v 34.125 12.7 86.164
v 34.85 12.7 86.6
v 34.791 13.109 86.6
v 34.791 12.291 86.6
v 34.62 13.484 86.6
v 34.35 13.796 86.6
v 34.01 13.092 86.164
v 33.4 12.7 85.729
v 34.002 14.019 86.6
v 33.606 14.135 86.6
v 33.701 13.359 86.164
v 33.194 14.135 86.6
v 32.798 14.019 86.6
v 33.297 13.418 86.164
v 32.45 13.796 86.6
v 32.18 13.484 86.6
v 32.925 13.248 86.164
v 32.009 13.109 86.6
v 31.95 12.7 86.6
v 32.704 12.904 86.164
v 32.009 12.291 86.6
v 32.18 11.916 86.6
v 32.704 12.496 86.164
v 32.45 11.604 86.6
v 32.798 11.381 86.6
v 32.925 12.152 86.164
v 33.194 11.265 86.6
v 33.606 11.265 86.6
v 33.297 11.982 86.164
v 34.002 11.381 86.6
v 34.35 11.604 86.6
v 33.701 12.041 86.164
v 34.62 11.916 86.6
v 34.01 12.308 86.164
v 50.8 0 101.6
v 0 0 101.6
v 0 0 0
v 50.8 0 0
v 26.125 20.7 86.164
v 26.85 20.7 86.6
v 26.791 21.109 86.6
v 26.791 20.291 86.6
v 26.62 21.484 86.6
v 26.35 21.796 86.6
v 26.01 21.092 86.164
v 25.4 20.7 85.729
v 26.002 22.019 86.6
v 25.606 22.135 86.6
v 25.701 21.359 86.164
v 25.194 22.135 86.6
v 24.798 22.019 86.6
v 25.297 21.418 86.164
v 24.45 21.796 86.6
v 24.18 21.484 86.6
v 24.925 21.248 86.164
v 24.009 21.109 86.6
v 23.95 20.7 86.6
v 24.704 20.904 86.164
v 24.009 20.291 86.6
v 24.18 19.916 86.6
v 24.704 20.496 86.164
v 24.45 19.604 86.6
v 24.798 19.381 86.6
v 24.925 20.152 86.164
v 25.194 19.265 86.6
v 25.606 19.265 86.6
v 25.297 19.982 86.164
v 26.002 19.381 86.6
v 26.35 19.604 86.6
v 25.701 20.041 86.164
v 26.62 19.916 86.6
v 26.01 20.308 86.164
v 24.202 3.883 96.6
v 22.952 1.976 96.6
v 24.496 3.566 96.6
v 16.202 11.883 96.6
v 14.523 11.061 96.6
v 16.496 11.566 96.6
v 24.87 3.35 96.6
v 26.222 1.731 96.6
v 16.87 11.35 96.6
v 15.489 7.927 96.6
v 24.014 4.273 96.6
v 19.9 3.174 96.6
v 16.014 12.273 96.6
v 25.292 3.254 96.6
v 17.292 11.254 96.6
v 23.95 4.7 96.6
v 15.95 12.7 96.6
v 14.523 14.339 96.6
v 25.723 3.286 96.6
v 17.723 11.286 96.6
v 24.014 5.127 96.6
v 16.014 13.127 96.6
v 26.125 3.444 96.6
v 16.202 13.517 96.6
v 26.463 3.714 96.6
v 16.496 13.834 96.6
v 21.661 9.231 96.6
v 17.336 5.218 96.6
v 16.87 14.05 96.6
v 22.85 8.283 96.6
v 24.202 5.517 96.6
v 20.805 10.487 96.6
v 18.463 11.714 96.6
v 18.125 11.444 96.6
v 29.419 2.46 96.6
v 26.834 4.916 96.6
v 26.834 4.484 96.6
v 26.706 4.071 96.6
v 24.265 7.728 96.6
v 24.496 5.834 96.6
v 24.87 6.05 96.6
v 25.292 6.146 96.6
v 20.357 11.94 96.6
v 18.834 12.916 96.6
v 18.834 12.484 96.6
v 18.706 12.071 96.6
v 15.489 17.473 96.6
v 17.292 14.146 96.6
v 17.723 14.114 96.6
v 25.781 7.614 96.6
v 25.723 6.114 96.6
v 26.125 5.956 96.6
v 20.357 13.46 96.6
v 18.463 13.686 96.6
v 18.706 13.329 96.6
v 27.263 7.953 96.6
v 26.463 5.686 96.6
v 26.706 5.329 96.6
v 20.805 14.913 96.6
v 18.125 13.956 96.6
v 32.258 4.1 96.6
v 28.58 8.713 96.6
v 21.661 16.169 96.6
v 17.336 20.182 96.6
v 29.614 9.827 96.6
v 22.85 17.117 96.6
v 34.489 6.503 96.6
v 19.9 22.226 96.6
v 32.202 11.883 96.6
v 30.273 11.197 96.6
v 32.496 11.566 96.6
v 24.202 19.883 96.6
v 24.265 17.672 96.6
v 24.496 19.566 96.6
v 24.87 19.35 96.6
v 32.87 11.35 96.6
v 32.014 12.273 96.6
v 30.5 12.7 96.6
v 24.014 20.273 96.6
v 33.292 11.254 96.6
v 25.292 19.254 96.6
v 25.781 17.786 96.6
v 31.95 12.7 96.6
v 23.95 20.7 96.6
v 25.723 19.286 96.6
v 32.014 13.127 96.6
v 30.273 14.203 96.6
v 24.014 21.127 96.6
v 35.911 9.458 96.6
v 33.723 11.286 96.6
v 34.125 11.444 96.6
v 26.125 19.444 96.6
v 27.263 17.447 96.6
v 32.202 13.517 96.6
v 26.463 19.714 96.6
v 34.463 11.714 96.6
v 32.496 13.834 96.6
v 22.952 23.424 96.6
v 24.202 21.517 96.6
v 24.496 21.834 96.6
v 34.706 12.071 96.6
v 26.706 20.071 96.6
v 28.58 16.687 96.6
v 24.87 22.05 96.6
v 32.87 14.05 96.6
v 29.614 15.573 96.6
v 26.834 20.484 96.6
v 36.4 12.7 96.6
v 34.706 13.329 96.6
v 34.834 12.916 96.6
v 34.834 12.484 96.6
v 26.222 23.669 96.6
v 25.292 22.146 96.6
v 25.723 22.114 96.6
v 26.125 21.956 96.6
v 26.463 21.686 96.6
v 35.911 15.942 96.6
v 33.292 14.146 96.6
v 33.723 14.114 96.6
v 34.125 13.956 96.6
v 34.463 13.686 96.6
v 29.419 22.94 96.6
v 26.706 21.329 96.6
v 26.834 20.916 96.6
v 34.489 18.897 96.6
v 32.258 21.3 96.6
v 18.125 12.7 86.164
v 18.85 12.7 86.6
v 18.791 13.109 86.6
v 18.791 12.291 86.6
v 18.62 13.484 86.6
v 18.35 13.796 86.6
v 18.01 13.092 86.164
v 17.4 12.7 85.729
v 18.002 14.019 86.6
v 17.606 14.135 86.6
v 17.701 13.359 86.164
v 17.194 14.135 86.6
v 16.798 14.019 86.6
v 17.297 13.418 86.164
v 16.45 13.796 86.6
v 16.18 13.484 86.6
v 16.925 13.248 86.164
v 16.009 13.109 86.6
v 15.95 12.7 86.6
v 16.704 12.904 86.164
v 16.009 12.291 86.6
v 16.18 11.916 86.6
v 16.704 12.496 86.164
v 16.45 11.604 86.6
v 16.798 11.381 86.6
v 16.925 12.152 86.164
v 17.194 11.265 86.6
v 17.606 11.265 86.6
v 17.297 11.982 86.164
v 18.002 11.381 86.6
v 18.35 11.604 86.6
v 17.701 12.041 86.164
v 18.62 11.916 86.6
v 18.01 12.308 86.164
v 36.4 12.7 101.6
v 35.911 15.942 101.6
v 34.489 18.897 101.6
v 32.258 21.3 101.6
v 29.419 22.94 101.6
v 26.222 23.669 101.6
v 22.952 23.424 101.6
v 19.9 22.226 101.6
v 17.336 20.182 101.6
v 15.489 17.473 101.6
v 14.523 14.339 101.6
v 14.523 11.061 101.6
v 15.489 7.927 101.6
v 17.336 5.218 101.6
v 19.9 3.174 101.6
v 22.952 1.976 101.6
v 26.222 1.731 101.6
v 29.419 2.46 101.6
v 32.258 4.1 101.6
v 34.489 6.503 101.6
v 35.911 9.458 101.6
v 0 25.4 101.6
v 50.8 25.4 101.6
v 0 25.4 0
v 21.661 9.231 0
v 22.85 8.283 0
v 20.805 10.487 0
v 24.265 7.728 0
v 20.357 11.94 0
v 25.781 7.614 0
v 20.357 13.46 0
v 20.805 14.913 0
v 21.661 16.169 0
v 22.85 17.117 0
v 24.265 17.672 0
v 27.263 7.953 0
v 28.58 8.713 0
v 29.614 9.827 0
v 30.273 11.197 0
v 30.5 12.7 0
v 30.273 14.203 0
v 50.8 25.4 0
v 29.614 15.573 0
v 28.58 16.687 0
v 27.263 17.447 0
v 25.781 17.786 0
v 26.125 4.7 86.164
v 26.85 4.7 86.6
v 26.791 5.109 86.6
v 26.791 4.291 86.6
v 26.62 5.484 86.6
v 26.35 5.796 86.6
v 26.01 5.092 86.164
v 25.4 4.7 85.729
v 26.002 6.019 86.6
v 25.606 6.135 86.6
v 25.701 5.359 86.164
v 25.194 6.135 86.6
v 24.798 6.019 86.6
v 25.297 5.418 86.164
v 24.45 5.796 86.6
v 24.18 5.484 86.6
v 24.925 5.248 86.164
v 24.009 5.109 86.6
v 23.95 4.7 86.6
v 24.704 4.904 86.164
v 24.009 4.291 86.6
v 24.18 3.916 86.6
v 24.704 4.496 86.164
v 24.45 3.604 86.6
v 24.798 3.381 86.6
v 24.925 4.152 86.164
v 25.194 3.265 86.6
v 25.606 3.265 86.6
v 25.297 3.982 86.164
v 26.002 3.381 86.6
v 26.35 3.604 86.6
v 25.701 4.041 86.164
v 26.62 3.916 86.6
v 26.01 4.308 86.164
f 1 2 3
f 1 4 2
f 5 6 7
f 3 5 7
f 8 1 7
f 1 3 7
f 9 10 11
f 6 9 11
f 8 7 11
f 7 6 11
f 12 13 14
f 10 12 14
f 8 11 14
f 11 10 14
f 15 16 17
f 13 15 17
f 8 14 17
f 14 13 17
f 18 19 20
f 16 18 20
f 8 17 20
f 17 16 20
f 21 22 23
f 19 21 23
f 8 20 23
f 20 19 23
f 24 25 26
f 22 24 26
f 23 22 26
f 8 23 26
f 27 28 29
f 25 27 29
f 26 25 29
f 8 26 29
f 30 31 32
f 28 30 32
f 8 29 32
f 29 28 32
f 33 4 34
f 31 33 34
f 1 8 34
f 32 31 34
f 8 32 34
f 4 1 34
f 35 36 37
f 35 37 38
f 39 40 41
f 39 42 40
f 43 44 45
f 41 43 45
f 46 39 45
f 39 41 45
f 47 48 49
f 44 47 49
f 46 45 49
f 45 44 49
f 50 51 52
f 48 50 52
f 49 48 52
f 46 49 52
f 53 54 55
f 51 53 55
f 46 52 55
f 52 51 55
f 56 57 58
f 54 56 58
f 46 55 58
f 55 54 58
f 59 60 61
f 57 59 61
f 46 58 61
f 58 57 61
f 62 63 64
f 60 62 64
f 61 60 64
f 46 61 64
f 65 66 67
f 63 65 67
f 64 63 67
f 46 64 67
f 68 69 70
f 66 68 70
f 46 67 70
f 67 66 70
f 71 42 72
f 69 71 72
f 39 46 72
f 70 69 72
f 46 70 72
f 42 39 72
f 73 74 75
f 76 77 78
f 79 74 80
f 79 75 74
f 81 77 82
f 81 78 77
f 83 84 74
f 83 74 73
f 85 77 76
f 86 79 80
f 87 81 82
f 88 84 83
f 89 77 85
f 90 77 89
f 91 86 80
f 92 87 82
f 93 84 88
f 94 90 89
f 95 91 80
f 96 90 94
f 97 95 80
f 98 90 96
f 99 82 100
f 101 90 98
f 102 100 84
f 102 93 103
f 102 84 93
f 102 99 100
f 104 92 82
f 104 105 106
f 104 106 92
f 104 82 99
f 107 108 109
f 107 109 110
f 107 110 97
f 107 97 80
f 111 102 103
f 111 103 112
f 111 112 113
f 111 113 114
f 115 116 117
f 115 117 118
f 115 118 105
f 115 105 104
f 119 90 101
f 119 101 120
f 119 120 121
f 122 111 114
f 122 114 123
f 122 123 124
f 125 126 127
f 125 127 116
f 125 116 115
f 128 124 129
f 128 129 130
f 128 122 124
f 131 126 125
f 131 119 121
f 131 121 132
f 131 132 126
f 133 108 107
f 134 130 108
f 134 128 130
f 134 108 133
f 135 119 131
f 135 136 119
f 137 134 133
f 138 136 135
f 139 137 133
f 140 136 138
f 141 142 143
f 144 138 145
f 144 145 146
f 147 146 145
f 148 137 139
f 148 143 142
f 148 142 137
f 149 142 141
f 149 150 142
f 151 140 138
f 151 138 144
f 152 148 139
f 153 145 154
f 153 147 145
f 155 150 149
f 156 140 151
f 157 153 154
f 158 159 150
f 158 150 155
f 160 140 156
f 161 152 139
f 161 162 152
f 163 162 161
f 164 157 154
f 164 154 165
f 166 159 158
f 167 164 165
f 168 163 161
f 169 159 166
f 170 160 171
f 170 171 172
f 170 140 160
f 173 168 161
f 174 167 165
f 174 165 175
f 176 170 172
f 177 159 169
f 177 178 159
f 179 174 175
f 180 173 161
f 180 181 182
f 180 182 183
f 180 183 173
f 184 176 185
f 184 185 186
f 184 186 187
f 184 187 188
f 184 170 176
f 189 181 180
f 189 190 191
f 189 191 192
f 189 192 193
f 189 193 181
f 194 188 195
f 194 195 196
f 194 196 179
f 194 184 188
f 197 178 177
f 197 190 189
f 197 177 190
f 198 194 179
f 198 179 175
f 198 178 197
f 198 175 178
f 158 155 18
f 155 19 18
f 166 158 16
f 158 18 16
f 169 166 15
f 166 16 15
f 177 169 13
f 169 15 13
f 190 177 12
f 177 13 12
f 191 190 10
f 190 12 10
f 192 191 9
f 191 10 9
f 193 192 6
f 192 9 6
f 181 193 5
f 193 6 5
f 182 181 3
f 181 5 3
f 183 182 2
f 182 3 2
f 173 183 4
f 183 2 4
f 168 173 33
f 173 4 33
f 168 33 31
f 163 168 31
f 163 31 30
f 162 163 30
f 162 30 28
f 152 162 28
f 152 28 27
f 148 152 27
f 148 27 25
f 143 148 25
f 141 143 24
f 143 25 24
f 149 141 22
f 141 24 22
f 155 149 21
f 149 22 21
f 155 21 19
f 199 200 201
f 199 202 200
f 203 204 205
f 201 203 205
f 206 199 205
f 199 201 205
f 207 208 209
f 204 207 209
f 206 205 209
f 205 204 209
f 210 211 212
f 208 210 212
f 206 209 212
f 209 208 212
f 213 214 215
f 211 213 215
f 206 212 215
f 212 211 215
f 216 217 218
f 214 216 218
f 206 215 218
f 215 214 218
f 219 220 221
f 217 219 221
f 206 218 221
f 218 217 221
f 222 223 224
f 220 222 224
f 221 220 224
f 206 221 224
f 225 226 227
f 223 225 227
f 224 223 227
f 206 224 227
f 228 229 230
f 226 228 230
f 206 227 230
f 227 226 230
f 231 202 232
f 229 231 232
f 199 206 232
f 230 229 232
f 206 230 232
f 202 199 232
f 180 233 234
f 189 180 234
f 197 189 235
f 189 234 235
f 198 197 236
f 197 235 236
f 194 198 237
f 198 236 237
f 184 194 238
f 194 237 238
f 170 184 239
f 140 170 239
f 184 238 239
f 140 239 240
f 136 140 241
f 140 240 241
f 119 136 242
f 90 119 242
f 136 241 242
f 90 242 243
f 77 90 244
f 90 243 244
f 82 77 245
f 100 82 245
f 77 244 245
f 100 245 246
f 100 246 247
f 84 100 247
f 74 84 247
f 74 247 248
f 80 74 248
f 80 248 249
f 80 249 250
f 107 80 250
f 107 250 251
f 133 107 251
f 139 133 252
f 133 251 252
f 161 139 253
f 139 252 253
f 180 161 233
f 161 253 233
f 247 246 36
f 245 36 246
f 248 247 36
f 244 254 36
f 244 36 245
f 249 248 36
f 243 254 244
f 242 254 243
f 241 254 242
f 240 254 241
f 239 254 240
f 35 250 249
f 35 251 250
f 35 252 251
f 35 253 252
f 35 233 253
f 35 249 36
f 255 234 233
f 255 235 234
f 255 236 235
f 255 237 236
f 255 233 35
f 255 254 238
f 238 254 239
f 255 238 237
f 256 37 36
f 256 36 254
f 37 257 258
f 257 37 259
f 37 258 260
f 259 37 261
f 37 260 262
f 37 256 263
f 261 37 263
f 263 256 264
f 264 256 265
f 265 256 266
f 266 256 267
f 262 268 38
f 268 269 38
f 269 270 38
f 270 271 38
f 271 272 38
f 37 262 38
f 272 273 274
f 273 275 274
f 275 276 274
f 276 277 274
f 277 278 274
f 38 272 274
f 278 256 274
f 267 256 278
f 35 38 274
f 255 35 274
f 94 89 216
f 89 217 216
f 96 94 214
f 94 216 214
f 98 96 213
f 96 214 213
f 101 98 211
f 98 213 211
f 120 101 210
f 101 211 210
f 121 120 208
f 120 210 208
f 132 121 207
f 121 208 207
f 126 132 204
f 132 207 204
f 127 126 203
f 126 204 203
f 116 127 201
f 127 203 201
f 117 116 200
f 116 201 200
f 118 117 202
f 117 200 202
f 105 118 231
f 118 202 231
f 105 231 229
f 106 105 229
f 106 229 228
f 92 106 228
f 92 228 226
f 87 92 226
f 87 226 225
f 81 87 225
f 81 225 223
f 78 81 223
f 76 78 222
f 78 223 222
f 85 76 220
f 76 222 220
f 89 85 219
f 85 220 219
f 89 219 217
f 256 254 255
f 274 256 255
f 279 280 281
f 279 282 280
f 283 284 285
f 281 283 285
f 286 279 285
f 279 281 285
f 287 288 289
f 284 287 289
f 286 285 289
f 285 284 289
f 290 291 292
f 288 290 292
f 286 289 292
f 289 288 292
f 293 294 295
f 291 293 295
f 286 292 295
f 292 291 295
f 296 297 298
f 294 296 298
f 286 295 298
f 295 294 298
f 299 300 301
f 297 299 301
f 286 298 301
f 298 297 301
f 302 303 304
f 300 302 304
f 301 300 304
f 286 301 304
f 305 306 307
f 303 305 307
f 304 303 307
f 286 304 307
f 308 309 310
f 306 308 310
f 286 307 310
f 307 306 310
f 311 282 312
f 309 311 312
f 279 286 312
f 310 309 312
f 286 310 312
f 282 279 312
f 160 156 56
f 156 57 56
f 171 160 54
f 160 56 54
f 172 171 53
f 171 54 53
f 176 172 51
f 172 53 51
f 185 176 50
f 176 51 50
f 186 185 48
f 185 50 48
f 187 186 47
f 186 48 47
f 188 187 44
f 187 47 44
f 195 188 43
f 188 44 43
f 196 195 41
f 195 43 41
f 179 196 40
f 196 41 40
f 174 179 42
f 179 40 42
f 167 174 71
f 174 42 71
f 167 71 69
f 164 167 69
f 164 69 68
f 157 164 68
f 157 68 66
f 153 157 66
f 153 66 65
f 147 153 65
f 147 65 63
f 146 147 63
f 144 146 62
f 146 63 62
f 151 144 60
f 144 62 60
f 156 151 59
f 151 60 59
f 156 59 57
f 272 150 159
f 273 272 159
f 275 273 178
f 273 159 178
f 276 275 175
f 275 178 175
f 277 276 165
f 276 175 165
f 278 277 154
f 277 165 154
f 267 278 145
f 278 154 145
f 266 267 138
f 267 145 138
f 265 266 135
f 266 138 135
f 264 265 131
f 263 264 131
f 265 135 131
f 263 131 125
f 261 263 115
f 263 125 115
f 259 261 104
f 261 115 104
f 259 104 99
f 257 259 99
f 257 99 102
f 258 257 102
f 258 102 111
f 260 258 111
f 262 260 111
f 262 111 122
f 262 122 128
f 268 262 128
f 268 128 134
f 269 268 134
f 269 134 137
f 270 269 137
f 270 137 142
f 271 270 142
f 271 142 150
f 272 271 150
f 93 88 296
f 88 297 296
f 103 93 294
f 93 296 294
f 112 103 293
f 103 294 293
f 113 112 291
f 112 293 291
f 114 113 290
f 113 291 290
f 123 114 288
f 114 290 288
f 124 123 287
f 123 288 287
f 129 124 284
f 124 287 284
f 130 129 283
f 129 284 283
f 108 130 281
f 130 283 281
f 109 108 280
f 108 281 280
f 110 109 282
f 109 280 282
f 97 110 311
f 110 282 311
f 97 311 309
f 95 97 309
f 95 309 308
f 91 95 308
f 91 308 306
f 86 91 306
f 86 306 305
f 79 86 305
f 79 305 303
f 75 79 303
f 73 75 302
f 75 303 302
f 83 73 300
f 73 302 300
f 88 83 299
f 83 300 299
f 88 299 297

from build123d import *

# Parameters (mm, degrees)
SKETCH1_W                  = 50.8
SKETCH1_H                  = 25.4
BASE_DEPTH                 = 101.6
SKETCH2_R                  = 10.999999971
LEADNUT_FLANGE_INSET_DEPTH = 4.999999906
SKETCH3_R                  = 5.09999996
LEADNUT_THROUGH_HOLE_DEPTH = 113.059627066
LEADNUT_HOLE_PATTERN_D     = 2.9
LEADNUT_HOLE_PATTERN_DEPTH = 10.0000054
LEADNUT_HOLE_PATTERN_TIP   = 0.871247898


with BuildPart() as part:
    # Sketch1 → base (new body)
    with BuildSketch(Plane.XY):
        with Locations((25.4, 12.7)):
            Rectangle(SKETCH1_W, SKETCH1_H)
    extrude(amount=BASE_DEPTH)

    # Sketch2 → leadnut_flange_inset (cut)
    with BuildSketch(Plane.XY.offset(101.6)):
        with Locations((25.4, 12.7)):
            Circle(SKETCH2_R)
    extrude(amount=-LEADNUT_FLANGE_INSET_DEPTH, mode=Mode.SUBTRACT)

    # Sketch3 → leadnut_through_hole (cut, through all)
    with BuildSketch(Plane.XY.offset(96.600000094)):
        with Locations((25.4, 12.7)):
            Circle(SKETCH3_R)
    extrude(amount=-LEADNUT_THROUGH_HOLE_DEPTH, mode=Mode.SUBTRACT)

    # leadnut_hole_pattern
    with Locations(Plane.XY.offset(96.600000094)):
        with Locations((25.4, 12.7), (25.4, 20.6999967), (17.4000033, 12.7), (25.4, 4.7000033), (33.3999967, 12.7)):
            Hole(LEADNUT_HOLE_PATTERN_D / 2, depth=LEADNUT_HOLE_PATTERN_DEPTH)
            with Locations((0, 0, -(LEADNUT_HOLE_PATTERN_DEPTH + LEADNUT_HOLE_PATTERN_TIP / 2))):  # 118° drill point
                Cone(0, LEADNUT_HOLE_PATTERN_D / 2, LEADNUT_HOLE_PATTERN_TIP, mode=Mode.SUBTRACT)


solid = part.part
